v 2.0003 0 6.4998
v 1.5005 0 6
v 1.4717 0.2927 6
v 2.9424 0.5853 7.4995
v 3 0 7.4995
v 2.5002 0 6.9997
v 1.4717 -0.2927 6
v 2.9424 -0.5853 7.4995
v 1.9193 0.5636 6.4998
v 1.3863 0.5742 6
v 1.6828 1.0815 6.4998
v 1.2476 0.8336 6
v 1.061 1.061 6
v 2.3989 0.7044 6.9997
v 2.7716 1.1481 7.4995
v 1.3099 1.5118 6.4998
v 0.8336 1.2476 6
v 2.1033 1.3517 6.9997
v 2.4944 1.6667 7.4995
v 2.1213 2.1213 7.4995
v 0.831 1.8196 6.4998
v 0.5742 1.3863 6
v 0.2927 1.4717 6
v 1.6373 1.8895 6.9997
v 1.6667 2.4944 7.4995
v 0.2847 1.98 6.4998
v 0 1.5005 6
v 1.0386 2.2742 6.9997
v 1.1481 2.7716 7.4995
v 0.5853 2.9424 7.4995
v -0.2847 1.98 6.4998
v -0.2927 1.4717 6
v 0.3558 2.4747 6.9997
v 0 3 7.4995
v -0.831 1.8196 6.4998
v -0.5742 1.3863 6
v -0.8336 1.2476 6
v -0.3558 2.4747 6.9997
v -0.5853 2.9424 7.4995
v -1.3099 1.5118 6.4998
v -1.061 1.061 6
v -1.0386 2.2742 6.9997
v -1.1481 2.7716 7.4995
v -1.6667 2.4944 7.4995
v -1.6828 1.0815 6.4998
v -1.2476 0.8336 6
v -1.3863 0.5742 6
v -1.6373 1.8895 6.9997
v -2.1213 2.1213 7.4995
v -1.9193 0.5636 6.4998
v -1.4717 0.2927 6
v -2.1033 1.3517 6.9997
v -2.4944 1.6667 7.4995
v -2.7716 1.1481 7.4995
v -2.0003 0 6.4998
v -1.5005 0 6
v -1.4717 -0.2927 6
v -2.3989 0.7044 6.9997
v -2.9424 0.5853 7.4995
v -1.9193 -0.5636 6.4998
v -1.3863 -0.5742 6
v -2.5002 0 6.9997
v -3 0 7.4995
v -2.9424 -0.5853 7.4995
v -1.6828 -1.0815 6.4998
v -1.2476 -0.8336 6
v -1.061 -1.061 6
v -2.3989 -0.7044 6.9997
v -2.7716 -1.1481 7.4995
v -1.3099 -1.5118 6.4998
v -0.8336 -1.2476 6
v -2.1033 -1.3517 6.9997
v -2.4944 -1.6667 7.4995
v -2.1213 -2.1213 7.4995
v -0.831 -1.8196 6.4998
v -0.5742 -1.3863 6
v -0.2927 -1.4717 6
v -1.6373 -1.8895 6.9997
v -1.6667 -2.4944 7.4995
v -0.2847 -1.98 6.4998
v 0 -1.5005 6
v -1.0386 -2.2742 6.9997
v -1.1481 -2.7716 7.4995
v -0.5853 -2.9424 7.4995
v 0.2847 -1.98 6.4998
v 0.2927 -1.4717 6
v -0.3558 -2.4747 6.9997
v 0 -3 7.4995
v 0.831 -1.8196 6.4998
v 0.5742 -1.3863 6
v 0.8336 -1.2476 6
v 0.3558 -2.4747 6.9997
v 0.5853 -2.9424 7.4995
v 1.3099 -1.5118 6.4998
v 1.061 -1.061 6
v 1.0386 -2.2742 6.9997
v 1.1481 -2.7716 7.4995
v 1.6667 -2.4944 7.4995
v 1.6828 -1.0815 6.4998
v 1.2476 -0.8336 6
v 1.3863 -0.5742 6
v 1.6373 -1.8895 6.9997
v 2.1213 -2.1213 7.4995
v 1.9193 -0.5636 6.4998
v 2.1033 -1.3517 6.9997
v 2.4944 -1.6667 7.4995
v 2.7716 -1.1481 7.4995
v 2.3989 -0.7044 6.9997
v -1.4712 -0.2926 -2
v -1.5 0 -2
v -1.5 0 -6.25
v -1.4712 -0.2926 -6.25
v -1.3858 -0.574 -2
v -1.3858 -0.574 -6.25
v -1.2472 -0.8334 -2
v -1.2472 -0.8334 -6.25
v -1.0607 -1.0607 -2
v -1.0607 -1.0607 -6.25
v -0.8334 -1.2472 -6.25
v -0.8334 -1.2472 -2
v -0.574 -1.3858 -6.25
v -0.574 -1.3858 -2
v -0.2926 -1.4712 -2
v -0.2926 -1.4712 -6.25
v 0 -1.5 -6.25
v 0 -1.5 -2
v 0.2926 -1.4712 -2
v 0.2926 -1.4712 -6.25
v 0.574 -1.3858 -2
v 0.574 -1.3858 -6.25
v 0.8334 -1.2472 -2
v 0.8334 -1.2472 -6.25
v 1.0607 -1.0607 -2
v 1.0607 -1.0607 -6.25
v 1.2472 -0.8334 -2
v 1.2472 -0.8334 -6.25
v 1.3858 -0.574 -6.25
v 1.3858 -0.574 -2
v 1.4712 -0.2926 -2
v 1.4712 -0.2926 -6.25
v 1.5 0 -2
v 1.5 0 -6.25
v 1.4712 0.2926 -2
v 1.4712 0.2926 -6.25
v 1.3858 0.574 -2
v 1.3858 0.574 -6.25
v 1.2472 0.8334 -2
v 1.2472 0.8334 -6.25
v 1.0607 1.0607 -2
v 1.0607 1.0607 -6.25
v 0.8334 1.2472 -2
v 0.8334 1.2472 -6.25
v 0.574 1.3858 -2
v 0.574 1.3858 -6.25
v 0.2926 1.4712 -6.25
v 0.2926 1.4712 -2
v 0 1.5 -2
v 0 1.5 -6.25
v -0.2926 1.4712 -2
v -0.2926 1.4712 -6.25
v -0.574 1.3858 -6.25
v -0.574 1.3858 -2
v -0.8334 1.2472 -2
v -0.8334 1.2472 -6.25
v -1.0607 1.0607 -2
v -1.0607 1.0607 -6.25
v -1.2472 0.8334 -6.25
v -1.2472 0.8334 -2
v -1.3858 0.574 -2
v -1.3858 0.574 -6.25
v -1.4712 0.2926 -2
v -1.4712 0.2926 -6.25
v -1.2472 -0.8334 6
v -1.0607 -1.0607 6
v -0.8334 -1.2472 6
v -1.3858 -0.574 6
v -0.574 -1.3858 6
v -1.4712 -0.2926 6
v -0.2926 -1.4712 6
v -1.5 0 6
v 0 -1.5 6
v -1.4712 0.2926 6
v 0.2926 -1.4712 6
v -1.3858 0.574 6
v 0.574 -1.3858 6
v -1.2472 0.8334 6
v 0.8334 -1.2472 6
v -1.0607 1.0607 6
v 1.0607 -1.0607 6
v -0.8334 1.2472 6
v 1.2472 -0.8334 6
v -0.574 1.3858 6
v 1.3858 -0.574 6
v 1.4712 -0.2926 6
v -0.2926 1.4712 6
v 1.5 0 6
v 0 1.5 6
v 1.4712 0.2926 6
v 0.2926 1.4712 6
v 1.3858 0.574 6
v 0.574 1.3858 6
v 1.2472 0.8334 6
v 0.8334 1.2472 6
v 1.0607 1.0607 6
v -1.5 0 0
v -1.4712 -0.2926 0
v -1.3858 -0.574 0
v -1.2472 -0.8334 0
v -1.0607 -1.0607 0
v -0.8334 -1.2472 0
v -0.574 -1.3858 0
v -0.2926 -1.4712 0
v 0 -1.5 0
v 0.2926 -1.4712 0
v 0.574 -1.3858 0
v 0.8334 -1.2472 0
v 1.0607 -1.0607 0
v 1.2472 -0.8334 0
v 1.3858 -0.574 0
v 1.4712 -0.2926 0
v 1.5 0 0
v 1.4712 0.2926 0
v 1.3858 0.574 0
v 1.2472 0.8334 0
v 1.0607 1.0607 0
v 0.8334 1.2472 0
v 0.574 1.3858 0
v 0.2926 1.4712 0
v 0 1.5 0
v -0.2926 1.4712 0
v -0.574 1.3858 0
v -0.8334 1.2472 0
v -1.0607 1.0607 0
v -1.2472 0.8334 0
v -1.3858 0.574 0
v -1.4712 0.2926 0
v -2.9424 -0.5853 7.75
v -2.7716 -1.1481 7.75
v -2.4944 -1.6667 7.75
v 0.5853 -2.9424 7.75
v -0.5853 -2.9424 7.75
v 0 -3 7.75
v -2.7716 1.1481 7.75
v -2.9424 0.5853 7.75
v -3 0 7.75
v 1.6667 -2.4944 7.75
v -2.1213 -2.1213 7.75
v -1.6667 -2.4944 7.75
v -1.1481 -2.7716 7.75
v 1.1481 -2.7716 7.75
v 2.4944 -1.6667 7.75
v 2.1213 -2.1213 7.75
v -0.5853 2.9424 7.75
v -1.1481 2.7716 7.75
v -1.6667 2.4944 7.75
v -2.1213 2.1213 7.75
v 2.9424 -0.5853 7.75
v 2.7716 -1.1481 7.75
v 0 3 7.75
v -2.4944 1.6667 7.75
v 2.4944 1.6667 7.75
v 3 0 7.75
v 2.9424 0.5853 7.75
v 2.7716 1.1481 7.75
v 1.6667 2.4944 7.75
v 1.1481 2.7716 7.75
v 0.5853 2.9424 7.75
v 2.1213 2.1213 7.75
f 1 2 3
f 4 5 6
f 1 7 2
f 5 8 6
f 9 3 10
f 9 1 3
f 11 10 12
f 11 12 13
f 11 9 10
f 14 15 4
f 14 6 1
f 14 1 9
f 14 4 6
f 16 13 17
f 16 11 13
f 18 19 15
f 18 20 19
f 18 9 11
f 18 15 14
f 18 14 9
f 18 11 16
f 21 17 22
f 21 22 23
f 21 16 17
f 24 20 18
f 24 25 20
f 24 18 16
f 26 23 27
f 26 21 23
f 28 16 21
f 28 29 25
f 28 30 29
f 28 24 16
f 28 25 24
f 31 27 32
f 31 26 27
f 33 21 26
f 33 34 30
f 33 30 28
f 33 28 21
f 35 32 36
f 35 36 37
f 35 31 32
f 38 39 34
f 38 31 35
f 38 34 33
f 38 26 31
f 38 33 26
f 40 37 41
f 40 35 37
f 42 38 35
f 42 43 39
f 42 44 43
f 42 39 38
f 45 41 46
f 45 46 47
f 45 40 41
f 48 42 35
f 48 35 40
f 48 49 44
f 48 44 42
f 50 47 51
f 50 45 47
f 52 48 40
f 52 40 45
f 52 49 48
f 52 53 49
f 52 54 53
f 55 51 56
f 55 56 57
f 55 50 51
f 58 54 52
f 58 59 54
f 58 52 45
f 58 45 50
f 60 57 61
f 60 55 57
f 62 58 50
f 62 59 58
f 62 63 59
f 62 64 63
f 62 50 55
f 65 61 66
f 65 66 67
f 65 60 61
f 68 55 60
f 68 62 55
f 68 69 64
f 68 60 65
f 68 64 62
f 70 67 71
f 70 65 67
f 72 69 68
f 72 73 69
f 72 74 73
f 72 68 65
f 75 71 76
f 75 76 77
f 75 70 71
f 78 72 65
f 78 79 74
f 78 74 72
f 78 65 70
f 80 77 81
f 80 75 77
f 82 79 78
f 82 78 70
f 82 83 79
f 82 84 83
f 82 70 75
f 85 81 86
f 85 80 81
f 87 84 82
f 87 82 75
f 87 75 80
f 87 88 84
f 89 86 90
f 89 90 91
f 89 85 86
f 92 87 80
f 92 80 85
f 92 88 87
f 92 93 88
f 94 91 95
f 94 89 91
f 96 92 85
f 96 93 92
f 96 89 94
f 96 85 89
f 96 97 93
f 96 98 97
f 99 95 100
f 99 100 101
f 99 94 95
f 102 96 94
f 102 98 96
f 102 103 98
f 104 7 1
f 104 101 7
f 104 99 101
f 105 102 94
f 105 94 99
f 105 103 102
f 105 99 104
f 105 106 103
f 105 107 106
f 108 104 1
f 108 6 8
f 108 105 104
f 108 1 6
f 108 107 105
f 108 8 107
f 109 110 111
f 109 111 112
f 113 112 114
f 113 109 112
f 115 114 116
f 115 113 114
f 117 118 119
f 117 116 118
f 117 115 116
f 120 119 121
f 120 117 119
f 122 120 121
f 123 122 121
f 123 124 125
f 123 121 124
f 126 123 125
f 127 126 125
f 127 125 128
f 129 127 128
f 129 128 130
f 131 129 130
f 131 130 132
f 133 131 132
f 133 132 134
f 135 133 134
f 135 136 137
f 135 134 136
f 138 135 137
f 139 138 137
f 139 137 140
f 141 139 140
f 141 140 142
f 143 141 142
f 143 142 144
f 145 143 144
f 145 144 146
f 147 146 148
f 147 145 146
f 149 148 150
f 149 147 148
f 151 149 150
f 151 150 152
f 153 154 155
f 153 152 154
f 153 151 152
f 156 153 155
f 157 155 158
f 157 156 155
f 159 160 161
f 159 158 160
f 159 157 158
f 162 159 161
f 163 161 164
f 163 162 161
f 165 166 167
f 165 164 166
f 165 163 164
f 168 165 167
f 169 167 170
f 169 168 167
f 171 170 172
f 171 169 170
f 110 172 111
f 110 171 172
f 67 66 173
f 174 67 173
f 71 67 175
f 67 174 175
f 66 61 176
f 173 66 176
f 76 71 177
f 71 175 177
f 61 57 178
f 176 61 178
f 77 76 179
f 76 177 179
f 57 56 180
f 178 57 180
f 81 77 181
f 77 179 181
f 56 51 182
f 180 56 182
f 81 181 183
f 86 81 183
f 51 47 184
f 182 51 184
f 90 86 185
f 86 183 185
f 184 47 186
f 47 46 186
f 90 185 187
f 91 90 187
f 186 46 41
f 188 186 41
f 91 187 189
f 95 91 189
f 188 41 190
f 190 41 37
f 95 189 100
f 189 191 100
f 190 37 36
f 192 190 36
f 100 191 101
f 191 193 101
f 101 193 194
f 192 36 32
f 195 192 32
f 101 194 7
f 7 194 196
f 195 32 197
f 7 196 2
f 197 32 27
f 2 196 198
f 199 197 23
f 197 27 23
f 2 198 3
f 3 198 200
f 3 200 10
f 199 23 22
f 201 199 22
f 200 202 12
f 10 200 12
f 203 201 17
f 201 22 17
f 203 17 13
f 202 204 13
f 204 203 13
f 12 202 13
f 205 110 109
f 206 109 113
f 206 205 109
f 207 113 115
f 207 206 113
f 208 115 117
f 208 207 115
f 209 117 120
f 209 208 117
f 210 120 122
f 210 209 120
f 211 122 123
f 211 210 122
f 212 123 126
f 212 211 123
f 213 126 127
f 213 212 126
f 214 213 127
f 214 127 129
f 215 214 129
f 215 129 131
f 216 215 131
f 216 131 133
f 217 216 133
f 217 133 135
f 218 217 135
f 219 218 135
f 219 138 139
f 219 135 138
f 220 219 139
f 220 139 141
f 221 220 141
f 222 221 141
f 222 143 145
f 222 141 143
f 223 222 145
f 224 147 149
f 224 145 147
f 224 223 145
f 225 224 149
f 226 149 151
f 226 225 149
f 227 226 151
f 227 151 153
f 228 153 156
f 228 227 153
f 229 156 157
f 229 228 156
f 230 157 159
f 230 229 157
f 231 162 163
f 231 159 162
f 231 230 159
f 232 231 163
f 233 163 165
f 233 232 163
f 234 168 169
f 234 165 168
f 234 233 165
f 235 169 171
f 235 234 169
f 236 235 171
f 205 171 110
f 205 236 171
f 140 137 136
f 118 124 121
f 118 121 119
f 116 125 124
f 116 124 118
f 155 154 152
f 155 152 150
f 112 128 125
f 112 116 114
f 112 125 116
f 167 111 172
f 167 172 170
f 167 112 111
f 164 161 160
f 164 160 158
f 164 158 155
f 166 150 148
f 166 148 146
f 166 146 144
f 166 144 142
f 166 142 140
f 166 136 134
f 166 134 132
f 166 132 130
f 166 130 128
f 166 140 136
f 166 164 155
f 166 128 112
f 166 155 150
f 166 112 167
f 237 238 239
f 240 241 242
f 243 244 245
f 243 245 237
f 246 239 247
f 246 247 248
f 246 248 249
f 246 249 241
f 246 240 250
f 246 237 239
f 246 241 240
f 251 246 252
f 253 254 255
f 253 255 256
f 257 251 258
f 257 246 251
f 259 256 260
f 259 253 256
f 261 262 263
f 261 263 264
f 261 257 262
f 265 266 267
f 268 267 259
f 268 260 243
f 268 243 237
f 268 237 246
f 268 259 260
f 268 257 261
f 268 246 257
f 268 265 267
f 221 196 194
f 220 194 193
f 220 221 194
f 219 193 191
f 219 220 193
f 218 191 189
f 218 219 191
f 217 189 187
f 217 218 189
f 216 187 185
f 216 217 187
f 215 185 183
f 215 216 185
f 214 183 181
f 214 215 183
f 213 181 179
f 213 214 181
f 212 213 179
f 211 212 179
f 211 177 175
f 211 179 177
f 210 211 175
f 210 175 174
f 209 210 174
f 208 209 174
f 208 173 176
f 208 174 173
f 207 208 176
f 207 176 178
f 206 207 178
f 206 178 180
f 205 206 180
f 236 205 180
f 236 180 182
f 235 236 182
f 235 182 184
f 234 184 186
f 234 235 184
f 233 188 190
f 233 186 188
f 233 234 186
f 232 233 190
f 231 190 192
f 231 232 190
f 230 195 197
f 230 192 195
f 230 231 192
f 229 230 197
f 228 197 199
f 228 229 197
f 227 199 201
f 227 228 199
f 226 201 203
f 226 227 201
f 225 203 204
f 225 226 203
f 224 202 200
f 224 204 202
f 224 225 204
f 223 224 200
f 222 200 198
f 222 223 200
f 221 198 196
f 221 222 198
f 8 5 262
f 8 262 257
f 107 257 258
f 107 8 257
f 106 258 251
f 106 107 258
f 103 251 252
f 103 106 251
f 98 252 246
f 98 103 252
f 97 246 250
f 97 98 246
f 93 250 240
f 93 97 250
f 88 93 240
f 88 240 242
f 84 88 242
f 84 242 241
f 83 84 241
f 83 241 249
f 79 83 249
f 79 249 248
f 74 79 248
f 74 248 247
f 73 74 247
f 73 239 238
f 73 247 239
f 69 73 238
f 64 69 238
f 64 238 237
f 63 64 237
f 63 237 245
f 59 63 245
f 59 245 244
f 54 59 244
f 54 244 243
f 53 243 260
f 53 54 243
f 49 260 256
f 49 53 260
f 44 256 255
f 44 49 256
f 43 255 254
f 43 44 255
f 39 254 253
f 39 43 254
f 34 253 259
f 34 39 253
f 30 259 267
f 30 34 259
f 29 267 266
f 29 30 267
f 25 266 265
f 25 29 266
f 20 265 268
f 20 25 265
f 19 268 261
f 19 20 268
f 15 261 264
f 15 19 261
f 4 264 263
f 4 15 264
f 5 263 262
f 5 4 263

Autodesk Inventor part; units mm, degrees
ref_plane "YZ Plane" through (0, 0, 0) normal (1, 0, 0) x (0, 1, 0)
ref_plane "XZ Plane" through (0, 0, 0) normal (0, 1, 0) x (-1, 0, 0)
ref_plane "XY Plane" through (0, 0, 0) normal (0, 0, 1) x (1, 0, 0)
sketch "スケッチ1" plane through (0, 0, 0) normal (0, 0, 1) x (1, 0, 0)
  circle A0 centre (0, 0) radius 1.5
  dimension "d0" = 3
extrude "押し出し1" add sketch "スケッチ1" along normal blind 6
sketch "スケッチ2" plane through (0, 0, 6) normal (0, 0, 1) x (1, 0, 0)
  circle A0 centre (0, 0) radius 1.5 projected
  circle A1 centre (0, 0) radius 3
  dimension "d3" = 6
extrude "押し出し2" add sketch "スケッチ2" along normal blind 1.75 contours A0 | A1
thread "ねじ1" size "M3x0.5" class "6g" standard "ANSI Metric M Profile" full length
chamfer "面取り1" distance 1.5 angle 45 1 edges at (-3, 0, 6)
sketch "スケッチ4" plane through (0, 0, 0) normal (0, 0, -1) x (-1, 0, 0)
  circle A0 centre (0, 0) radius 1.5 projected
extrude "押し出し4" add sketch "スケッチ4" along normal blind 4
sketch "スケッチ5" plane through (0, 0, -4) normal (0, 0, -1) x (-1, 0, 0)
  circle A0 centre (0, 0) radius 1.5 projected
extrude "押し出し5" cut sketch "スケッチ5" against normal blind 2
sketch "スケッチ6" plane through (0, 0, -2) normal (0, 0, -1) x (-1, 0, 0)
  circle A0 centre (0, 0) radius 1.5 projected
extrude "押し出し6" add sketch "スケッチ6" along normal blind 4.25
properties part number "SB　14mm皿ネジ" material "Steel, Mild"
